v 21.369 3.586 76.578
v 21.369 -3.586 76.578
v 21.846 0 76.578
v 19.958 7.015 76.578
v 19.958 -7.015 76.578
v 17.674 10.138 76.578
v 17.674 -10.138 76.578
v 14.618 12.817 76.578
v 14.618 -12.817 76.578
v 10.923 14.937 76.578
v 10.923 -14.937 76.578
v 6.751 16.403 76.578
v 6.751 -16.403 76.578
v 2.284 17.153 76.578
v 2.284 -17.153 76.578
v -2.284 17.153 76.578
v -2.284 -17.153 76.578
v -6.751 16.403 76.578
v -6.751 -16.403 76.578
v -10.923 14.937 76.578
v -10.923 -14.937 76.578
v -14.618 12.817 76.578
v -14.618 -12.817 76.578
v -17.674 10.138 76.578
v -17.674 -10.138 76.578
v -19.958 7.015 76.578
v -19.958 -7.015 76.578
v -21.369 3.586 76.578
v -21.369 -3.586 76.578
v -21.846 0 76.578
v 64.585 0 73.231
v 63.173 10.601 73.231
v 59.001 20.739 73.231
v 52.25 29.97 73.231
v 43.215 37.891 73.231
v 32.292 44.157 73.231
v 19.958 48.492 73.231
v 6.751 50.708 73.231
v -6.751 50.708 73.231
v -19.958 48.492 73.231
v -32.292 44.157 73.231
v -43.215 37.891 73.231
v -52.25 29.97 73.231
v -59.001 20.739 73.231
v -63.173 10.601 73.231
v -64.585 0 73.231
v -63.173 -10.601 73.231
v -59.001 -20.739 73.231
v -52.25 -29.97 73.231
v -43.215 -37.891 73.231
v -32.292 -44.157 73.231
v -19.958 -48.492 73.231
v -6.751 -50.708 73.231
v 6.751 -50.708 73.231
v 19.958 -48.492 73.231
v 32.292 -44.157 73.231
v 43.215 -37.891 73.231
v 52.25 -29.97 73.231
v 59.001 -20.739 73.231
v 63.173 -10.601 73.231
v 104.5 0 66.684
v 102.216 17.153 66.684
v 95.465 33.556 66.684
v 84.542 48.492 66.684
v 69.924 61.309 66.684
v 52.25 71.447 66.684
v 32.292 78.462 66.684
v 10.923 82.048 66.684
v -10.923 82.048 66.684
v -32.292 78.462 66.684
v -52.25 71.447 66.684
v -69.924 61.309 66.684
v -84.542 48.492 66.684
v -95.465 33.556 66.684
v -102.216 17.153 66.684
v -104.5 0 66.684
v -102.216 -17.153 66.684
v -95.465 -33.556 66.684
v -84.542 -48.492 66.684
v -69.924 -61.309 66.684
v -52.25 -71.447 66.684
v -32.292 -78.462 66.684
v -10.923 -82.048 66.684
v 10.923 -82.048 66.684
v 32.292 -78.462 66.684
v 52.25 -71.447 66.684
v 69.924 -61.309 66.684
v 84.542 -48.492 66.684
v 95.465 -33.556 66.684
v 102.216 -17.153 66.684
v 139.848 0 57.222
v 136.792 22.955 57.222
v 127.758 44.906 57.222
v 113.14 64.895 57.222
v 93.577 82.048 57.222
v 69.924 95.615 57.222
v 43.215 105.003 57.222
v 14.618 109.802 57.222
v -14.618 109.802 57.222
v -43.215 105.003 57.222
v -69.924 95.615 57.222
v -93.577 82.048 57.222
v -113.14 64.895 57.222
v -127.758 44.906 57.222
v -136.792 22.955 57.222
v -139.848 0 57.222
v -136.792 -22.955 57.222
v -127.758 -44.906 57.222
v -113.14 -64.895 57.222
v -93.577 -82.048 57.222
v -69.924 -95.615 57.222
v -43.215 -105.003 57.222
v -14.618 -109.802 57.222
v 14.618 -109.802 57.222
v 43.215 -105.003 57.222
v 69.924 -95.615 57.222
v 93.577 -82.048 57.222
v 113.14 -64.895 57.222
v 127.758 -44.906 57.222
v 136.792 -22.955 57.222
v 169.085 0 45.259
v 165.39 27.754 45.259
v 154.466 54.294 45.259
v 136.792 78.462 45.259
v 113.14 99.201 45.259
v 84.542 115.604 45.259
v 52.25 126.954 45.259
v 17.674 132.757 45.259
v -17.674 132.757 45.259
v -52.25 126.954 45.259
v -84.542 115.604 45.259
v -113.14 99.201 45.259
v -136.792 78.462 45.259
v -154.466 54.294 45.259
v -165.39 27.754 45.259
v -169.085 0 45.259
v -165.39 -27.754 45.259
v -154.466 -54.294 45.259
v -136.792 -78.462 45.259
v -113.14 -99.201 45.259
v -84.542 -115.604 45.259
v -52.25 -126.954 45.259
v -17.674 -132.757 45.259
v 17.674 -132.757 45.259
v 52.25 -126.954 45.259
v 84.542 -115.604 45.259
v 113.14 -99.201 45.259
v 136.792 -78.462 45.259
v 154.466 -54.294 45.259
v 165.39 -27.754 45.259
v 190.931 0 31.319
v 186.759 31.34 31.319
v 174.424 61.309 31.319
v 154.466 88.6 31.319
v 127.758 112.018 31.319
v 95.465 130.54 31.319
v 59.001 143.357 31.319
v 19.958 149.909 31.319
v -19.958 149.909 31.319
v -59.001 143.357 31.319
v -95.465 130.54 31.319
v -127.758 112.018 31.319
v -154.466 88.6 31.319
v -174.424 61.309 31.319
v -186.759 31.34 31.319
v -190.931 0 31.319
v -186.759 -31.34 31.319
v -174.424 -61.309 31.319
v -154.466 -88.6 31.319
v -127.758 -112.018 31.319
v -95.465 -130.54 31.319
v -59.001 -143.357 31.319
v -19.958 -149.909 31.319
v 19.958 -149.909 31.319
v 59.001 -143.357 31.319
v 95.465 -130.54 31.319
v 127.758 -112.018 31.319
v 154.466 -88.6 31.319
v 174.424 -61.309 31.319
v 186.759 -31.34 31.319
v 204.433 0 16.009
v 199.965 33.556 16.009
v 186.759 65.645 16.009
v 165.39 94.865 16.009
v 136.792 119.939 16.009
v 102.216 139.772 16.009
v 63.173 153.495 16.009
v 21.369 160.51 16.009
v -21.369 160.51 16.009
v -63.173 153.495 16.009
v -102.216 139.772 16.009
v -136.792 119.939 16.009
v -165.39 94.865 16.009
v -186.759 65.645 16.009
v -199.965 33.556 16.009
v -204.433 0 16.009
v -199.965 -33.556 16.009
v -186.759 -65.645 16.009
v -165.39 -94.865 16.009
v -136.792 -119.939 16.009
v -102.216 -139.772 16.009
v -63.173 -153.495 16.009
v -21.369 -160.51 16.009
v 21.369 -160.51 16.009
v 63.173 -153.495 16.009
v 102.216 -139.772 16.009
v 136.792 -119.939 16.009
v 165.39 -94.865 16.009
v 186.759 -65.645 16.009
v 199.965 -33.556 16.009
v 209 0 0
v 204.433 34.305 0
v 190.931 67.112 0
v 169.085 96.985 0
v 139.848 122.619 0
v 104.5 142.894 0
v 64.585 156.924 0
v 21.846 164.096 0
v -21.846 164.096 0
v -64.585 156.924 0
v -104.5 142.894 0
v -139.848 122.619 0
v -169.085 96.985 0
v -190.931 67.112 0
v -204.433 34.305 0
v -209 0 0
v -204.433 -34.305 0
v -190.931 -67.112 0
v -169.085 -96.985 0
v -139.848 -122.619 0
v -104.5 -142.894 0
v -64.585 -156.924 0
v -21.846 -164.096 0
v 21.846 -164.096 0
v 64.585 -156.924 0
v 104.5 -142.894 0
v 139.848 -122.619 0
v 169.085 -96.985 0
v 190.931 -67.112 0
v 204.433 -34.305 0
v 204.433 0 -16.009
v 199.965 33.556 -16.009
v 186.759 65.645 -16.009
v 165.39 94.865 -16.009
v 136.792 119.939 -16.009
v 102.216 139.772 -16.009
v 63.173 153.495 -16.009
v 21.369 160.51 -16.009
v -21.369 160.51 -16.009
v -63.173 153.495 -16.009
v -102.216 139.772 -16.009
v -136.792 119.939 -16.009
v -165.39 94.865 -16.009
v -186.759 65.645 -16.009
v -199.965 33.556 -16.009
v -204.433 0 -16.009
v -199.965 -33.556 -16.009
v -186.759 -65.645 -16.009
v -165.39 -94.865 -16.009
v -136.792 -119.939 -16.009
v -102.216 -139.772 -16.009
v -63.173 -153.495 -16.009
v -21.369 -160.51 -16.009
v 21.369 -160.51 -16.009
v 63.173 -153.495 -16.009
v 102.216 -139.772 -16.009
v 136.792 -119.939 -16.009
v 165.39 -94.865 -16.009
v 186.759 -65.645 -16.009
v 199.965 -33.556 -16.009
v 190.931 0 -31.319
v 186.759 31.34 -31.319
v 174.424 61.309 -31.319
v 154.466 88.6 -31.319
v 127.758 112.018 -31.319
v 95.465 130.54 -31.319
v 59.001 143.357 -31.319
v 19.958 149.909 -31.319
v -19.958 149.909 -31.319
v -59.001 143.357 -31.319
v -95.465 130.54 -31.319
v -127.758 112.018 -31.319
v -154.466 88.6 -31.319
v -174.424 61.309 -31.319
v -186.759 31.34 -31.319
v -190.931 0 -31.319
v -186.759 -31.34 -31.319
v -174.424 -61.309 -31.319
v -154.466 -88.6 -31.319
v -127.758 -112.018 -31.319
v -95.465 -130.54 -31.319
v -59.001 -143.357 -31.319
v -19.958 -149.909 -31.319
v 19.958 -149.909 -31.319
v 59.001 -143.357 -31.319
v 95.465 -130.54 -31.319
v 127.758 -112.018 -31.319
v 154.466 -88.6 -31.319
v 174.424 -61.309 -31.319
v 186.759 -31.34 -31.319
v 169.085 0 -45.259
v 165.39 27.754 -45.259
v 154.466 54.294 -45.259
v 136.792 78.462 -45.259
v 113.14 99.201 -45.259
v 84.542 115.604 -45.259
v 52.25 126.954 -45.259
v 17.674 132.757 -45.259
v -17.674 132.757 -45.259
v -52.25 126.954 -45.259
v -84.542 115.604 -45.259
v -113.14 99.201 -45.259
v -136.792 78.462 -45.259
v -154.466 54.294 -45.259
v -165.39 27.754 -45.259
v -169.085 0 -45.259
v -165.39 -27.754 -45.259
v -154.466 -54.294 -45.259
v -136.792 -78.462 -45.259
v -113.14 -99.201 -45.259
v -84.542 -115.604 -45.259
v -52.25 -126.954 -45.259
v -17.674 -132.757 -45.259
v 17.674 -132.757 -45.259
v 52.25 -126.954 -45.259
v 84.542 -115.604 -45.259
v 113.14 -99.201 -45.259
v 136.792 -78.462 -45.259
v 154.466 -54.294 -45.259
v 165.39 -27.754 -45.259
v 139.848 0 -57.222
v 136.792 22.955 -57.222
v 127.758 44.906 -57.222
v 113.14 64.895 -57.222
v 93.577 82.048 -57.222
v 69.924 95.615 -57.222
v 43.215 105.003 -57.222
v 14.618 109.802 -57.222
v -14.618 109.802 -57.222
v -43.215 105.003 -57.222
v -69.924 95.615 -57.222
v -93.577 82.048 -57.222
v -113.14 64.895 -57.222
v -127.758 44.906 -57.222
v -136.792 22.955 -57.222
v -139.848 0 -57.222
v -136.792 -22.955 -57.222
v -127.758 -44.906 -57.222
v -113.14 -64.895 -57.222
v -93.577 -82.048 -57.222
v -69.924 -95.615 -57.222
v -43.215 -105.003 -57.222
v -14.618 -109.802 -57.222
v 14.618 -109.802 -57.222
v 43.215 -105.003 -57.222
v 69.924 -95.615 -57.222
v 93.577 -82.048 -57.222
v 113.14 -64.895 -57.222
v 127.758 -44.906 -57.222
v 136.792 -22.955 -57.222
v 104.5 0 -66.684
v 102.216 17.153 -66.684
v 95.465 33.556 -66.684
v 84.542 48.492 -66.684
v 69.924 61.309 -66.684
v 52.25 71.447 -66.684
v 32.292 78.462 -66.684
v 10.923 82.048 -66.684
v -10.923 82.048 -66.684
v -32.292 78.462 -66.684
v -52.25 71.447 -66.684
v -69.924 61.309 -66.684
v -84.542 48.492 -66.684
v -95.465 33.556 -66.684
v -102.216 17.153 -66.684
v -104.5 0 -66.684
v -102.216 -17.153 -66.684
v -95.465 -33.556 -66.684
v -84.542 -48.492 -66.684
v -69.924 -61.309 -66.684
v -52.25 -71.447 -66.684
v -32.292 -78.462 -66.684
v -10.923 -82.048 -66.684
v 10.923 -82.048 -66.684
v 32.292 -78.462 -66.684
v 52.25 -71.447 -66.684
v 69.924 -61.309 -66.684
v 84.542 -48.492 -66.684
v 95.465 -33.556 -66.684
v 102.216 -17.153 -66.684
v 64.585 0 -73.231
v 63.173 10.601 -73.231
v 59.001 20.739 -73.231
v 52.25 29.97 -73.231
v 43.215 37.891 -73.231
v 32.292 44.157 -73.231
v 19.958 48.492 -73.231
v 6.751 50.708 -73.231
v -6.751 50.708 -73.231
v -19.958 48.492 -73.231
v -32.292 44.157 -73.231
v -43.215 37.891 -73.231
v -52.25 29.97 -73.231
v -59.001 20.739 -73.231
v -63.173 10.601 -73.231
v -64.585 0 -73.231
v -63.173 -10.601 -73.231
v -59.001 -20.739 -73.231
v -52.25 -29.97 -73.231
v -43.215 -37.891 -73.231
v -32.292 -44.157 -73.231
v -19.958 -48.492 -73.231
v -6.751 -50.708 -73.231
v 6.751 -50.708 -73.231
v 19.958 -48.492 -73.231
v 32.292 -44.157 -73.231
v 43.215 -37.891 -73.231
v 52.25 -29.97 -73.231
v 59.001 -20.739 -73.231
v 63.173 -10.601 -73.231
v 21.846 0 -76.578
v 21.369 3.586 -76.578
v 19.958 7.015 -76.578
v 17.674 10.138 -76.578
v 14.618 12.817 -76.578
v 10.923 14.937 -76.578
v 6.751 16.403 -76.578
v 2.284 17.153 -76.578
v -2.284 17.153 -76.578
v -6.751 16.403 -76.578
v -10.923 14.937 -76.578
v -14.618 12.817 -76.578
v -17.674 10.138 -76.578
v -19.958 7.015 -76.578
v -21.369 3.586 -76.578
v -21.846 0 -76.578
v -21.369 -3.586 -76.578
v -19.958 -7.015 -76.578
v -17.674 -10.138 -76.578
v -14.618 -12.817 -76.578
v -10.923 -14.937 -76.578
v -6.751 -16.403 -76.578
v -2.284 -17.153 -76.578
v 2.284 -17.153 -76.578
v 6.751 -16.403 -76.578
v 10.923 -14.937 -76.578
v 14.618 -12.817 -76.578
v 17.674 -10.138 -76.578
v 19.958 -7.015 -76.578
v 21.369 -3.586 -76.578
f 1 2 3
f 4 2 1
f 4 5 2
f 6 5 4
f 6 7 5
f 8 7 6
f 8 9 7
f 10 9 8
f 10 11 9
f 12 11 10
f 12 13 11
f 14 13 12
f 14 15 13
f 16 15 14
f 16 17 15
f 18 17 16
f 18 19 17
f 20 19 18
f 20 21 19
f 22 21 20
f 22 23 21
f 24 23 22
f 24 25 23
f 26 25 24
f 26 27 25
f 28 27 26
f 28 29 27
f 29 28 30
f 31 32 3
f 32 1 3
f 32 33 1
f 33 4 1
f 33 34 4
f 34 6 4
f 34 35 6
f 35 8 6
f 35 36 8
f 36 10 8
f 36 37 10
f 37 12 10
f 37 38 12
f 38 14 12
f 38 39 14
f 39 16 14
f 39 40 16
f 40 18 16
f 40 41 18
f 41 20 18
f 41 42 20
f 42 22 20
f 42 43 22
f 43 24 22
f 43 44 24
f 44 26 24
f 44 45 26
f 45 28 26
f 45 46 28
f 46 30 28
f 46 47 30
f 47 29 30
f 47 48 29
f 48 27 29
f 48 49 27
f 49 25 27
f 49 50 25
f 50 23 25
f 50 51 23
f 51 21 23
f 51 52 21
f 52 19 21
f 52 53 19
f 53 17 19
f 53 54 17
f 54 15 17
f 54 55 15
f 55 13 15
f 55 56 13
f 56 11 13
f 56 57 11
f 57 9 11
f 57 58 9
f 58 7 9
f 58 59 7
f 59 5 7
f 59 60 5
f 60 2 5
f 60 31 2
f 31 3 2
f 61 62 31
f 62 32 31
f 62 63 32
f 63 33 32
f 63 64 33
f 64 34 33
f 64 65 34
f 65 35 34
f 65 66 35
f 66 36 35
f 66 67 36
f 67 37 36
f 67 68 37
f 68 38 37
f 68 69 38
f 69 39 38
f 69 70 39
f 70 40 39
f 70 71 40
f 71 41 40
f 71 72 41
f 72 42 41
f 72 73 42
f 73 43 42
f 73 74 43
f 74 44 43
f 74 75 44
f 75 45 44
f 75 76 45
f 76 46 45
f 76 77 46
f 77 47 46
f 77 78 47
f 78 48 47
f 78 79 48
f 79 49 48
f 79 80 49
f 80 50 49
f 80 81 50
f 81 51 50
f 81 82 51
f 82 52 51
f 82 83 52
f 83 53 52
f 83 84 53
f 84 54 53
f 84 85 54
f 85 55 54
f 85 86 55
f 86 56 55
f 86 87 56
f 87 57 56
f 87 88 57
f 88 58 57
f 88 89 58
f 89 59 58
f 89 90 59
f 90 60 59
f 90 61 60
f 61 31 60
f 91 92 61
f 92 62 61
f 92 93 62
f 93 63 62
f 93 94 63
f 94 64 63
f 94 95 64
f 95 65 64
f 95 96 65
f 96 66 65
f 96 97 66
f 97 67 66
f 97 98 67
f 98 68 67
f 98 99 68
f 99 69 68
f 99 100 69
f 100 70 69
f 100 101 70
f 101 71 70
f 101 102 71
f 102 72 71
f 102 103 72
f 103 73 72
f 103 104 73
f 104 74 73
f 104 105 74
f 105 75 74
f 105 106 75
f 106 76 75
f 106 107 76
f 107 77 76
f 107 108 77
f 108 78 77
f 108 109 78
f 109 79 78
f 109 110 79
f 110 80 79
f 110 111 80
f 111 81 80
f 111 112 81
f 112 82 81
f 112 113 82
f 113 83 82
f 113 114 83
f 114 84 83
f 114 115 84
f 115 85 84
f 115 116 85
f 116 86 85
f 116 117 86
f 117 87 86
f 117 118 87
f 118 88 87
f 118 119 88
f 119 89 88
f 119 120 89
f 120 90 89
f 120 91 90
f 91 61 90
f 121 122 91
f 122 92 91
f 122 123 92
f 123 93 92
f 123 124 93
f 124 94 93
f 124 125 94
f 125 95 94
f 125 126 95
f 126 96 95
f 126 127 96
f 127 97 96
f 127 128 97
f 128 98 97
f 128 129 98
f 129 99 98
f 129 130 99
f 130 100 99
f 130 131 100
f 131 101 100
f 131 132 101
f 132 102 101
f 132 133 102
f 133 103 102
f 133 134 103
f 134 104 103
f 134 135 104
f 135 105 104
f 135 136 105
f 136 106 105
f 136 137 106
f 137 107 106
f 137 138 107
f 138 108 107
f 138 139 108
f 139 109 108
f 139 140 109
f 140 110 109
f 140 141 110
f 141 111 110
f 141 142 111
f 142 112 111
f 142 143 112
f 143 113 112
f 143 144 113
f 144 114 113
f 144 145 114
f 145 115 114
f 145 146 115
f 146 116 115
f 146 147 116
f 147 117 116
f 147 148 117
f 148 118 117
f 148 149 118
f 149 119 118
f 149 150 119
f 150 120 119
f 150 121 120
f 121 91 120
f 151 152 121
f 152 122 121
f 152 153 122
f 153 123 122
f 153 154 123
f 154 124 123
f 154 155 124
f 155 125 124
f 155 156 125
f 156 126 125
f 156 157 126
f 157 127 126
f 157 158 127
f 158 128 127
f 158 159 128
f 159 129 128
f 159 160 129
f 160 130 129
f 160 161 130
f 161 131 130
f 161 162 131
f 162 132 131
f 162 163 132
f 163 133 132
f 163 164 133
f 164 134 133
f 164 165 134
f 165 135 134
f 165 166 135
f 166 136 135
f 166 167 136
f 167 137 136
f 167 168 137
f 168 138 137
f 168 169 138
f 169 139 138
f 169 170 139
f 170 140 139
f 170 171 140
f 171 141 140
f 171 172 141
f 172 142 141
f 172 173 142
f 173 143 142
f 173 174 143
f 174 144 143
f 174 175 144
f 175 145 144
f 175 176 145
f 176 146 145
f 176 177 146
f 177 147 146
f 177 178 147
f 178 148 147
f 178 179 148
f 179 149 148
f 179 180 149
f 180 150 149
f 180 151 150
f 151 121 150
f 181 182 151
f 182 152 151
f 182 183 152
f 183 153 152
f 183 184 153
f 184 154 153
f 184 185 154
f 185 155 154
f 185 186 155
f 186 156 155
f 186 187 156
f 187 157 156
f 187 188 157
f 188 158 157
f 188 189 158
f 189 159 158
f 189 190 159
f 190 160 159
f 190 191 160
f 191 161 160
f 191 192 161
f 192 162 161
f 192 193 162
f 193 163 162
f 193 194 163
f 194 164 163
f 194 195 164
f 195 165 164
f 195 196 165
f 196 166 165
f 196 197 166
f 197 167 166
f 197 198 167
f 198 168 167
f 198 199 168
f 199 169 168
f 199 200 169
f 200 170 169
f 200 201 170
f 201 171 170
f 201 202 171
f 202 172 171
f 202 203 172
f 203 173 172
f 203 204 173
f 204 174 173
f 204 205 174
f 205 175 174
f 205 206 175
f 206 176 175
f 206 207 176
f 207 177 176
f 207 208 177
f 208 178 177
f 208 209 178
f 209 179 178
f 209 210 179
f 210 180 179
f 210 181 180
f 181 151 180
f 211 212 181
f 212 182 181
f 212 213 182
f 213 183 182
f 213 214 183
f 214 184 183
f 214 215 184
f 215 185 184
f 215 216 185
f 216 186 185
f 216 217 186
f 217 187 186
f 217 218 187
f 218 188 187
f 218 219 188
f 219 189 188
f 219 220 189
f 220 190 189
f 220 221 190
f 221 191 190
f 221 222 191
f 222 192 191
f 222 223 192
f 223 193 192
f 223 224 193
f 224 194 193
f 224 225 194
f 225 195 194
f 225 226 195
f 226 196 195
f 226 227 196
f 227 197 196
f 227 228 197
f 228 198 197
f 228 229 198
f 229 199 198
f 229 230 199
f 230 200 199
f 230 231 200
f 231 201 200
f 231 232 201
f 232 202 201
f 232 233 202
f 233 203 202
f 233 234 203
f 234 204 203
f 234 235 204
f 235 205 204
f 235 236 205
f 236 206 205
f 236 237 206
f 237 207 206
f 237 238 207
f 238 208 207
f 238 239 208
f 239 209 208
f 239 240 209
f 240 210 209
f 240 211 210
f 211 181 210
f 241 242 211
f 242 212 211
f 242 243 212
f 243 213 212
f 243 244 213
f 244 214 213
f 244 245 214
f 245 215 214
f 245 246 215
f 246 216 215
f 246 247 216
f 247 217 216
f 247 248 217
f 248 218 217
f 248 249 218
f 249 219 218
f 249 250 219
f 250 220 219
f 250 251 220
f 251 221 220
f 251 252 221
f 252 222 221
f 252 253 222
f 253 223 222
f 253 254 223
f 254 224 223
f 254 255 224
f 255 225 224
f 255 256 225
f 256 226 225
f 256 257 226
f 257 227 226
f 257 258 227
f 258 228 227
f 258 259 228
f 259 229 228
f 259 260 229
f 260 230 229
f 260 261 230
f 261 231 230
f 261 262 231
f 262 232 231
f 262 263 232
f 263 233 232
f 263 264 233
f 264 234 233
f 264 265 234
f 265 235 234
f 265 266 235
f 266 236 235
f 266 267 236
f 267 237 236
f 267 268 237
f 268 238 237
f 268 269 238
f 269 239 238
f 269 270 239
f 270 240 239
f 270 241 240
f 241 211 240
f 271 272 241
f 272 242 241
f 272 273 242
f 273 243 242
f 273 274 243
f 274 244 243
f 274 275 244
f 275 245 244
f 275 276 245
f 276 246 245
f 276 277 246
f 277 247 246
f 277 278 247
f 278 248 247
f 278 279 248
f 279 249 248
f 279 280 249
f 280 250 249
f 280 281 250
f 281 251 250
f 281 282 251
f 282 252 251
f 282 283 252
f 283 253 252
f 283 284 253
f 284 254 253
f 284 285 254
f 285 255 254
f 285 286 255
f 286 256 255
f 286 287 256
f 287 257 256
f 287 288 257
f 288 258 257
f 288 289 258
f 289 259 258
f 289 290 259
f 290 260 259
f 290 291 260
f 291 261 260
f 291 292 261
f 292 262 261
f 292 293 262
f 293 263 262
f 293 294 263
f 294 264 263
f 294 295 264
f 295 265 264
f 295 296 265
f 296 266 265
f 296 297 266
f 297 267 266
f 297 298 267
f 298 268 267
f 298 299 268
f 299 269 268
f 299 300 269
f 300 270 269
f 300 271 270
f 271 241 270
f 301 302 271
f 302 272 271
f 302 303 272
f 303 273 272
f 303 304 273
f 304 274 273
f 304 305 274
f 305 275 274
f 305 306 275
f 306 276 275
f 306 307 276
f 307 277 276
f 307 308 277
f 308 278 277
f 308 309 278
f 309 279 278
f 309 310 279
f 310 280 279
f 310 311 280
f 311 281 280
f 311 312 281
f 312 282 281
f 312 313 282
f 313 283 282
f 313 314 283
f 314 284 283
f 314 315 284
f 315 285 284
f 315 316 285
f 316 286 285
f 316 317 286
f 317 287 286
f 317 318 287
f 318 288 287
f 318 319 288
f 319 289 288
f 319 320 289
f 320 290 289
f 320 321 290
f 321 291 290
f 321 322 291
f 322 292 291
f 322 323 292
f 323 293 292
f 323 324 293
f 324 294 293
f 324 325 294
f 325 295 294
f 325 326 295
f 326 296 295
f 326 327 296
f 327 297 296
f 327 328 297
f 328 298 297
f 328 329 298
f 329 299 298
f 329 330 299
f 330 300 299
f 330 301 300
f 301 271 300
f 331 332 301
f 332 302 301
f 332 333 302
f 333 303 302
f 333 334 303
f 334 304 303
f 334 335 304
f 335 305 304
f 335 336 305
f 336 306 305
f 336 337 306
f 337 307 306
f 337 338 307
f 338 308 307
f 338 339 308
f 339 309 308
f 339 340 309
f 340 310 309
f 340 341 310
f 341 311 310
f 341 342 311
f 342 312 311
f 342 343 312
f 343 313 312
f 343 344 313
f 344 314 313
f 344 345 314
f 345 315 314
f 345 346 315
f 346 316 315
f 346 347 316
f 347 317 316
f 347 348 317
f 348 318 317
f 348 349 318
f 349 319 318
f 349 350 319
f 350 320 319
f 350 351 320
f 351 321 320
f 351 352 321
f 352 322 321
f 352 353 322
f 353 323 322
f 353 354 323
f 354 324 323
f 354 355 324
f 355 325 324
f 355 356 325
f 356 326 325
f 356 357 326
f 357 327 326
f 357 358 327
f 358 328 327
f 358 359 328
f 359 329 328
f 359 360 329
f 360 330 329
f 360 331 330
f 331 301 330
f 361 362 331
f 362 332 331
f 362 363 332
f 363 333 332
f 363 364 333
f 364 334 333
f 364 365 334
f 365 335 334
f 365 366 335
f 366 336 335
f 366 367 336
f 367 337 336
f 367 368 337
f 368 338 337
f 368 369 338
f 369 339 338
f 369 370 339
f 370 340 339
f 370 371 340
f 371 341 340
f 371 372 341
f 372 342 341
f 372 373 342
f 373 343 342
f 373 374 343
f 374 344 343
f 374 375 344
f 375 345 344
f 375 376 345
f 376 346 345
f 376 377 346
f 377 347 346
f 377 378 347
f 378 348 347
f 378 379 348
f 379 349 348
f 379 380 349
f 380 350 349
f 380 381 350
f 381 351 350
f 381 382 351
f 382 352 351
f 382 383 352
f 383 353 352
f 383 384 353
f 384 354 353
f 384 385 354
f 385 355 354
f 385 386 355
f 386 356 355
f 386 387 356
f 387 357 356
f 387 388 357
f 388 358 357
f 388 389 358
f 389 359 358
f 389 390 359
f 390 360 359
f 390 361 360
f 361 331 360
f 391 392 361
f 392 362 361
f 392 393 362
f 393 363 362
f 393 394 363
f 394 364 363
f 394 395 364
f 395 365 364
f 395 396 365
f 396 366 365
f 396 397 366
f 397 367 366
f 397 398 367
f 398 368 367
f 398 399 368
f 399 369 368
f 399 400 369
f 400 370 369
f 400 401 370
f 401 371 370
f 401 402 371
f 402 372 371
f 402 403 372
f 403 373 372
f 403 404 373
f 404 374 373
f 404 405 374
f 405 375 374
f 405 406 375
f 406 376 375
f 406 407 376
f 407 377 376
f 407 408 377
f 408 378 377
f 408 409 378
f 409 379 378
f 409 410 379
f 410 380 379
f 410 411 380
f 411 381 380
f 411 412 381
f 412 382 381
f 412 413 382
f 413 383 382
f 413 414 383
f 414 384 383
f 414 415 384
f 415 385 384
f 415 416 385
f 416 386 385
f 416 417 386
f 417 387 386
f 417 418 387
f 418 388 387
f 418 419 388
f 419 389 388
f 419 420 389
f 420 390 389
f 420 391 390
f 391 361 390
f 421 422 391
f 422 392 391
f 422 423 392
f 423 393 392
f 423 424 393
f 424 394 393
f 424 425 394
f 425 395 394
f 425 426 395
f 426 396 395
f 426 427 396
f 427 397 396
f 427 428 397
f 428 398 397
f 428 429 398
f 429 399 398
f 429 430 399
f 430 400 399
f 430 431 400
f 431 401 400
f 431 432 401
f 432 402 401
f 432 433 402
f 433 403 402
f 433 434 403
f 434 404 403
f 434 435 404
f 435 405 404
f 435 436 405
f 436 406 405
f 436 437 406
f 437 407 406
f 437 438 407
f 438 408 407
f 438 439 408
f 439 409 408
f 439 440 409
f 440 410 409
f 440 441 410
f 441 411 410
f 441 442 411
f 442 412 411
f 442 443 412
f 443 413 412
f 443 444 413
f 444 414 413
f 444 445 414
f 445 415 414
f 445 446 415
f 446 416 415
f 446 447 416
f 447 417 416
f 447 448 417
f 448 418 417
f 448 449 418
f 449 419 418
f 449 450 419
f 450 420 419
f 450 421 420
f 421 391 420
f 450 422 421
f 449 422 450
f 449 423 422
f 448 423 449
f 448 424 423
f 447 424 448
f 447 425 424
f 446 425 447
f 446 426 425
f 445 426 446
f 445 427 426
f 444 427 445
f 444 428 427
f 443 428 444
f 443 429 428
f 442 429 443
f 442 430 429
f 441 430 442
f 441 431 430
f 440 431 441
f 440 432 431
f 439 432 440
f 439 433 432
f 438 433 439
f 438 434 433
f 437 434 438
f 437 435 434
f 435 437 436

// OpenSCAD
// Generated by SolidPython 1.0.1 on 2020-07-29 00:46:54


scale(v = [19, 15, 7]) {
	sphere(r = 11);
}
/***********************************************
*********      SolidPython code:      **********
************************************************
 
# import packages: SolidPython
from solid import *
from solid.utils import *
from itertools import chain, combinations, permutations


class Resize:

    def __init__(self, scad_file):
        self.scad_file = scad_file
        #self.scad_file = import_scad(scad_file)
        # cone/cylinder param:
        self.r1 = 0
        self.r2 = 0
        self.h = 0
        # rectangular prism param:
        self.w = 0
        self.l = 0
        # ellipse param:
        self.r = 0

    # import OpenScad code (file name corresponds to shape)


    # classify shape + parameters
    def assign(self, param1, param2, param3):
        if self.scad_file == 'cone.scad':
            self.r1 = param1
            self.r2 = param2
            self.h = param3
        elif self.scad_file == 'cylinder.scad':
            self.r1 = param1
            self.r2 = param2
            self.h = param3
        elif self.scad_file == 'rectangularPrism.scad':
            self.h = param1
            self.l = param2
            self.w = param3
        else:
            self.r = param1
            self.h = param2

    # resize parameters
    def iterate(self):
        x = range(3, 20, 2)
        i = 1
        if self.scad_file == 'cone.scad':
            tempList = list(permutations(x, 2))
            for temp in tempList:
                param1 = temp[0]
                param2 = temp[1]
                filepath = 'produced_scad_files/' + 'cone' + str(param1) + '_' + str(param2) + '_' + '.scad'
                scad_render_to_file(cylinder(h=param1, r1=param2, r2=0), filepath)

        elif self.scad_file == 'cylinder.scad':
            tempList = list(permutations(x, 3))
            for temp in tempList:
                param1 = temp[0]
                param2 = temp[1]
                filepath = 'produced_scad_files/' + 'cylinder' + str(param1) + '_' + str(param2) + '_' + '.scad'
                scad_render_to_file(cylinder(h=param1, r1=param2, r2=param2), filepath)

        elif self.scad_file == 'rectangularPrism.scad':
            tempList = list(permutations(x, 3))
            for temp in tempList:
                param1 = temp[0]
                param2 = temp[1]
                param3 = temp[2]
                filepath = 'produced_scad_files/' + 'rectangularPrism' + str(param1) + '_' + str(param2) + '_' + str(
                    param3) + '.scad'
                scad_render_to_file(cube(size=(param1, param2, param3)), filepath)

        elif self.scad_file == 'ellipse.scad':
            tempList = list(permutations(x, 4))
            for temp in tempList:
                param1 = temp[0]
                param2 = temp[1]
                param3 = temp[2]
                param4 = temp[3]
                filepath = 'produced_scad_files/' + 'ellipse' + str(param1) + '_' + str(param2) + '_' + str(param3) + '_' + str(param4) + '.scad'
                scad_render_to_file(scale([param1, param2, param3])(sphere(r=param4)), filepath)

    def render_to_scadfile(self):
        scad_render_to_file(scad, 'example.scad') 
 
************************************************/
